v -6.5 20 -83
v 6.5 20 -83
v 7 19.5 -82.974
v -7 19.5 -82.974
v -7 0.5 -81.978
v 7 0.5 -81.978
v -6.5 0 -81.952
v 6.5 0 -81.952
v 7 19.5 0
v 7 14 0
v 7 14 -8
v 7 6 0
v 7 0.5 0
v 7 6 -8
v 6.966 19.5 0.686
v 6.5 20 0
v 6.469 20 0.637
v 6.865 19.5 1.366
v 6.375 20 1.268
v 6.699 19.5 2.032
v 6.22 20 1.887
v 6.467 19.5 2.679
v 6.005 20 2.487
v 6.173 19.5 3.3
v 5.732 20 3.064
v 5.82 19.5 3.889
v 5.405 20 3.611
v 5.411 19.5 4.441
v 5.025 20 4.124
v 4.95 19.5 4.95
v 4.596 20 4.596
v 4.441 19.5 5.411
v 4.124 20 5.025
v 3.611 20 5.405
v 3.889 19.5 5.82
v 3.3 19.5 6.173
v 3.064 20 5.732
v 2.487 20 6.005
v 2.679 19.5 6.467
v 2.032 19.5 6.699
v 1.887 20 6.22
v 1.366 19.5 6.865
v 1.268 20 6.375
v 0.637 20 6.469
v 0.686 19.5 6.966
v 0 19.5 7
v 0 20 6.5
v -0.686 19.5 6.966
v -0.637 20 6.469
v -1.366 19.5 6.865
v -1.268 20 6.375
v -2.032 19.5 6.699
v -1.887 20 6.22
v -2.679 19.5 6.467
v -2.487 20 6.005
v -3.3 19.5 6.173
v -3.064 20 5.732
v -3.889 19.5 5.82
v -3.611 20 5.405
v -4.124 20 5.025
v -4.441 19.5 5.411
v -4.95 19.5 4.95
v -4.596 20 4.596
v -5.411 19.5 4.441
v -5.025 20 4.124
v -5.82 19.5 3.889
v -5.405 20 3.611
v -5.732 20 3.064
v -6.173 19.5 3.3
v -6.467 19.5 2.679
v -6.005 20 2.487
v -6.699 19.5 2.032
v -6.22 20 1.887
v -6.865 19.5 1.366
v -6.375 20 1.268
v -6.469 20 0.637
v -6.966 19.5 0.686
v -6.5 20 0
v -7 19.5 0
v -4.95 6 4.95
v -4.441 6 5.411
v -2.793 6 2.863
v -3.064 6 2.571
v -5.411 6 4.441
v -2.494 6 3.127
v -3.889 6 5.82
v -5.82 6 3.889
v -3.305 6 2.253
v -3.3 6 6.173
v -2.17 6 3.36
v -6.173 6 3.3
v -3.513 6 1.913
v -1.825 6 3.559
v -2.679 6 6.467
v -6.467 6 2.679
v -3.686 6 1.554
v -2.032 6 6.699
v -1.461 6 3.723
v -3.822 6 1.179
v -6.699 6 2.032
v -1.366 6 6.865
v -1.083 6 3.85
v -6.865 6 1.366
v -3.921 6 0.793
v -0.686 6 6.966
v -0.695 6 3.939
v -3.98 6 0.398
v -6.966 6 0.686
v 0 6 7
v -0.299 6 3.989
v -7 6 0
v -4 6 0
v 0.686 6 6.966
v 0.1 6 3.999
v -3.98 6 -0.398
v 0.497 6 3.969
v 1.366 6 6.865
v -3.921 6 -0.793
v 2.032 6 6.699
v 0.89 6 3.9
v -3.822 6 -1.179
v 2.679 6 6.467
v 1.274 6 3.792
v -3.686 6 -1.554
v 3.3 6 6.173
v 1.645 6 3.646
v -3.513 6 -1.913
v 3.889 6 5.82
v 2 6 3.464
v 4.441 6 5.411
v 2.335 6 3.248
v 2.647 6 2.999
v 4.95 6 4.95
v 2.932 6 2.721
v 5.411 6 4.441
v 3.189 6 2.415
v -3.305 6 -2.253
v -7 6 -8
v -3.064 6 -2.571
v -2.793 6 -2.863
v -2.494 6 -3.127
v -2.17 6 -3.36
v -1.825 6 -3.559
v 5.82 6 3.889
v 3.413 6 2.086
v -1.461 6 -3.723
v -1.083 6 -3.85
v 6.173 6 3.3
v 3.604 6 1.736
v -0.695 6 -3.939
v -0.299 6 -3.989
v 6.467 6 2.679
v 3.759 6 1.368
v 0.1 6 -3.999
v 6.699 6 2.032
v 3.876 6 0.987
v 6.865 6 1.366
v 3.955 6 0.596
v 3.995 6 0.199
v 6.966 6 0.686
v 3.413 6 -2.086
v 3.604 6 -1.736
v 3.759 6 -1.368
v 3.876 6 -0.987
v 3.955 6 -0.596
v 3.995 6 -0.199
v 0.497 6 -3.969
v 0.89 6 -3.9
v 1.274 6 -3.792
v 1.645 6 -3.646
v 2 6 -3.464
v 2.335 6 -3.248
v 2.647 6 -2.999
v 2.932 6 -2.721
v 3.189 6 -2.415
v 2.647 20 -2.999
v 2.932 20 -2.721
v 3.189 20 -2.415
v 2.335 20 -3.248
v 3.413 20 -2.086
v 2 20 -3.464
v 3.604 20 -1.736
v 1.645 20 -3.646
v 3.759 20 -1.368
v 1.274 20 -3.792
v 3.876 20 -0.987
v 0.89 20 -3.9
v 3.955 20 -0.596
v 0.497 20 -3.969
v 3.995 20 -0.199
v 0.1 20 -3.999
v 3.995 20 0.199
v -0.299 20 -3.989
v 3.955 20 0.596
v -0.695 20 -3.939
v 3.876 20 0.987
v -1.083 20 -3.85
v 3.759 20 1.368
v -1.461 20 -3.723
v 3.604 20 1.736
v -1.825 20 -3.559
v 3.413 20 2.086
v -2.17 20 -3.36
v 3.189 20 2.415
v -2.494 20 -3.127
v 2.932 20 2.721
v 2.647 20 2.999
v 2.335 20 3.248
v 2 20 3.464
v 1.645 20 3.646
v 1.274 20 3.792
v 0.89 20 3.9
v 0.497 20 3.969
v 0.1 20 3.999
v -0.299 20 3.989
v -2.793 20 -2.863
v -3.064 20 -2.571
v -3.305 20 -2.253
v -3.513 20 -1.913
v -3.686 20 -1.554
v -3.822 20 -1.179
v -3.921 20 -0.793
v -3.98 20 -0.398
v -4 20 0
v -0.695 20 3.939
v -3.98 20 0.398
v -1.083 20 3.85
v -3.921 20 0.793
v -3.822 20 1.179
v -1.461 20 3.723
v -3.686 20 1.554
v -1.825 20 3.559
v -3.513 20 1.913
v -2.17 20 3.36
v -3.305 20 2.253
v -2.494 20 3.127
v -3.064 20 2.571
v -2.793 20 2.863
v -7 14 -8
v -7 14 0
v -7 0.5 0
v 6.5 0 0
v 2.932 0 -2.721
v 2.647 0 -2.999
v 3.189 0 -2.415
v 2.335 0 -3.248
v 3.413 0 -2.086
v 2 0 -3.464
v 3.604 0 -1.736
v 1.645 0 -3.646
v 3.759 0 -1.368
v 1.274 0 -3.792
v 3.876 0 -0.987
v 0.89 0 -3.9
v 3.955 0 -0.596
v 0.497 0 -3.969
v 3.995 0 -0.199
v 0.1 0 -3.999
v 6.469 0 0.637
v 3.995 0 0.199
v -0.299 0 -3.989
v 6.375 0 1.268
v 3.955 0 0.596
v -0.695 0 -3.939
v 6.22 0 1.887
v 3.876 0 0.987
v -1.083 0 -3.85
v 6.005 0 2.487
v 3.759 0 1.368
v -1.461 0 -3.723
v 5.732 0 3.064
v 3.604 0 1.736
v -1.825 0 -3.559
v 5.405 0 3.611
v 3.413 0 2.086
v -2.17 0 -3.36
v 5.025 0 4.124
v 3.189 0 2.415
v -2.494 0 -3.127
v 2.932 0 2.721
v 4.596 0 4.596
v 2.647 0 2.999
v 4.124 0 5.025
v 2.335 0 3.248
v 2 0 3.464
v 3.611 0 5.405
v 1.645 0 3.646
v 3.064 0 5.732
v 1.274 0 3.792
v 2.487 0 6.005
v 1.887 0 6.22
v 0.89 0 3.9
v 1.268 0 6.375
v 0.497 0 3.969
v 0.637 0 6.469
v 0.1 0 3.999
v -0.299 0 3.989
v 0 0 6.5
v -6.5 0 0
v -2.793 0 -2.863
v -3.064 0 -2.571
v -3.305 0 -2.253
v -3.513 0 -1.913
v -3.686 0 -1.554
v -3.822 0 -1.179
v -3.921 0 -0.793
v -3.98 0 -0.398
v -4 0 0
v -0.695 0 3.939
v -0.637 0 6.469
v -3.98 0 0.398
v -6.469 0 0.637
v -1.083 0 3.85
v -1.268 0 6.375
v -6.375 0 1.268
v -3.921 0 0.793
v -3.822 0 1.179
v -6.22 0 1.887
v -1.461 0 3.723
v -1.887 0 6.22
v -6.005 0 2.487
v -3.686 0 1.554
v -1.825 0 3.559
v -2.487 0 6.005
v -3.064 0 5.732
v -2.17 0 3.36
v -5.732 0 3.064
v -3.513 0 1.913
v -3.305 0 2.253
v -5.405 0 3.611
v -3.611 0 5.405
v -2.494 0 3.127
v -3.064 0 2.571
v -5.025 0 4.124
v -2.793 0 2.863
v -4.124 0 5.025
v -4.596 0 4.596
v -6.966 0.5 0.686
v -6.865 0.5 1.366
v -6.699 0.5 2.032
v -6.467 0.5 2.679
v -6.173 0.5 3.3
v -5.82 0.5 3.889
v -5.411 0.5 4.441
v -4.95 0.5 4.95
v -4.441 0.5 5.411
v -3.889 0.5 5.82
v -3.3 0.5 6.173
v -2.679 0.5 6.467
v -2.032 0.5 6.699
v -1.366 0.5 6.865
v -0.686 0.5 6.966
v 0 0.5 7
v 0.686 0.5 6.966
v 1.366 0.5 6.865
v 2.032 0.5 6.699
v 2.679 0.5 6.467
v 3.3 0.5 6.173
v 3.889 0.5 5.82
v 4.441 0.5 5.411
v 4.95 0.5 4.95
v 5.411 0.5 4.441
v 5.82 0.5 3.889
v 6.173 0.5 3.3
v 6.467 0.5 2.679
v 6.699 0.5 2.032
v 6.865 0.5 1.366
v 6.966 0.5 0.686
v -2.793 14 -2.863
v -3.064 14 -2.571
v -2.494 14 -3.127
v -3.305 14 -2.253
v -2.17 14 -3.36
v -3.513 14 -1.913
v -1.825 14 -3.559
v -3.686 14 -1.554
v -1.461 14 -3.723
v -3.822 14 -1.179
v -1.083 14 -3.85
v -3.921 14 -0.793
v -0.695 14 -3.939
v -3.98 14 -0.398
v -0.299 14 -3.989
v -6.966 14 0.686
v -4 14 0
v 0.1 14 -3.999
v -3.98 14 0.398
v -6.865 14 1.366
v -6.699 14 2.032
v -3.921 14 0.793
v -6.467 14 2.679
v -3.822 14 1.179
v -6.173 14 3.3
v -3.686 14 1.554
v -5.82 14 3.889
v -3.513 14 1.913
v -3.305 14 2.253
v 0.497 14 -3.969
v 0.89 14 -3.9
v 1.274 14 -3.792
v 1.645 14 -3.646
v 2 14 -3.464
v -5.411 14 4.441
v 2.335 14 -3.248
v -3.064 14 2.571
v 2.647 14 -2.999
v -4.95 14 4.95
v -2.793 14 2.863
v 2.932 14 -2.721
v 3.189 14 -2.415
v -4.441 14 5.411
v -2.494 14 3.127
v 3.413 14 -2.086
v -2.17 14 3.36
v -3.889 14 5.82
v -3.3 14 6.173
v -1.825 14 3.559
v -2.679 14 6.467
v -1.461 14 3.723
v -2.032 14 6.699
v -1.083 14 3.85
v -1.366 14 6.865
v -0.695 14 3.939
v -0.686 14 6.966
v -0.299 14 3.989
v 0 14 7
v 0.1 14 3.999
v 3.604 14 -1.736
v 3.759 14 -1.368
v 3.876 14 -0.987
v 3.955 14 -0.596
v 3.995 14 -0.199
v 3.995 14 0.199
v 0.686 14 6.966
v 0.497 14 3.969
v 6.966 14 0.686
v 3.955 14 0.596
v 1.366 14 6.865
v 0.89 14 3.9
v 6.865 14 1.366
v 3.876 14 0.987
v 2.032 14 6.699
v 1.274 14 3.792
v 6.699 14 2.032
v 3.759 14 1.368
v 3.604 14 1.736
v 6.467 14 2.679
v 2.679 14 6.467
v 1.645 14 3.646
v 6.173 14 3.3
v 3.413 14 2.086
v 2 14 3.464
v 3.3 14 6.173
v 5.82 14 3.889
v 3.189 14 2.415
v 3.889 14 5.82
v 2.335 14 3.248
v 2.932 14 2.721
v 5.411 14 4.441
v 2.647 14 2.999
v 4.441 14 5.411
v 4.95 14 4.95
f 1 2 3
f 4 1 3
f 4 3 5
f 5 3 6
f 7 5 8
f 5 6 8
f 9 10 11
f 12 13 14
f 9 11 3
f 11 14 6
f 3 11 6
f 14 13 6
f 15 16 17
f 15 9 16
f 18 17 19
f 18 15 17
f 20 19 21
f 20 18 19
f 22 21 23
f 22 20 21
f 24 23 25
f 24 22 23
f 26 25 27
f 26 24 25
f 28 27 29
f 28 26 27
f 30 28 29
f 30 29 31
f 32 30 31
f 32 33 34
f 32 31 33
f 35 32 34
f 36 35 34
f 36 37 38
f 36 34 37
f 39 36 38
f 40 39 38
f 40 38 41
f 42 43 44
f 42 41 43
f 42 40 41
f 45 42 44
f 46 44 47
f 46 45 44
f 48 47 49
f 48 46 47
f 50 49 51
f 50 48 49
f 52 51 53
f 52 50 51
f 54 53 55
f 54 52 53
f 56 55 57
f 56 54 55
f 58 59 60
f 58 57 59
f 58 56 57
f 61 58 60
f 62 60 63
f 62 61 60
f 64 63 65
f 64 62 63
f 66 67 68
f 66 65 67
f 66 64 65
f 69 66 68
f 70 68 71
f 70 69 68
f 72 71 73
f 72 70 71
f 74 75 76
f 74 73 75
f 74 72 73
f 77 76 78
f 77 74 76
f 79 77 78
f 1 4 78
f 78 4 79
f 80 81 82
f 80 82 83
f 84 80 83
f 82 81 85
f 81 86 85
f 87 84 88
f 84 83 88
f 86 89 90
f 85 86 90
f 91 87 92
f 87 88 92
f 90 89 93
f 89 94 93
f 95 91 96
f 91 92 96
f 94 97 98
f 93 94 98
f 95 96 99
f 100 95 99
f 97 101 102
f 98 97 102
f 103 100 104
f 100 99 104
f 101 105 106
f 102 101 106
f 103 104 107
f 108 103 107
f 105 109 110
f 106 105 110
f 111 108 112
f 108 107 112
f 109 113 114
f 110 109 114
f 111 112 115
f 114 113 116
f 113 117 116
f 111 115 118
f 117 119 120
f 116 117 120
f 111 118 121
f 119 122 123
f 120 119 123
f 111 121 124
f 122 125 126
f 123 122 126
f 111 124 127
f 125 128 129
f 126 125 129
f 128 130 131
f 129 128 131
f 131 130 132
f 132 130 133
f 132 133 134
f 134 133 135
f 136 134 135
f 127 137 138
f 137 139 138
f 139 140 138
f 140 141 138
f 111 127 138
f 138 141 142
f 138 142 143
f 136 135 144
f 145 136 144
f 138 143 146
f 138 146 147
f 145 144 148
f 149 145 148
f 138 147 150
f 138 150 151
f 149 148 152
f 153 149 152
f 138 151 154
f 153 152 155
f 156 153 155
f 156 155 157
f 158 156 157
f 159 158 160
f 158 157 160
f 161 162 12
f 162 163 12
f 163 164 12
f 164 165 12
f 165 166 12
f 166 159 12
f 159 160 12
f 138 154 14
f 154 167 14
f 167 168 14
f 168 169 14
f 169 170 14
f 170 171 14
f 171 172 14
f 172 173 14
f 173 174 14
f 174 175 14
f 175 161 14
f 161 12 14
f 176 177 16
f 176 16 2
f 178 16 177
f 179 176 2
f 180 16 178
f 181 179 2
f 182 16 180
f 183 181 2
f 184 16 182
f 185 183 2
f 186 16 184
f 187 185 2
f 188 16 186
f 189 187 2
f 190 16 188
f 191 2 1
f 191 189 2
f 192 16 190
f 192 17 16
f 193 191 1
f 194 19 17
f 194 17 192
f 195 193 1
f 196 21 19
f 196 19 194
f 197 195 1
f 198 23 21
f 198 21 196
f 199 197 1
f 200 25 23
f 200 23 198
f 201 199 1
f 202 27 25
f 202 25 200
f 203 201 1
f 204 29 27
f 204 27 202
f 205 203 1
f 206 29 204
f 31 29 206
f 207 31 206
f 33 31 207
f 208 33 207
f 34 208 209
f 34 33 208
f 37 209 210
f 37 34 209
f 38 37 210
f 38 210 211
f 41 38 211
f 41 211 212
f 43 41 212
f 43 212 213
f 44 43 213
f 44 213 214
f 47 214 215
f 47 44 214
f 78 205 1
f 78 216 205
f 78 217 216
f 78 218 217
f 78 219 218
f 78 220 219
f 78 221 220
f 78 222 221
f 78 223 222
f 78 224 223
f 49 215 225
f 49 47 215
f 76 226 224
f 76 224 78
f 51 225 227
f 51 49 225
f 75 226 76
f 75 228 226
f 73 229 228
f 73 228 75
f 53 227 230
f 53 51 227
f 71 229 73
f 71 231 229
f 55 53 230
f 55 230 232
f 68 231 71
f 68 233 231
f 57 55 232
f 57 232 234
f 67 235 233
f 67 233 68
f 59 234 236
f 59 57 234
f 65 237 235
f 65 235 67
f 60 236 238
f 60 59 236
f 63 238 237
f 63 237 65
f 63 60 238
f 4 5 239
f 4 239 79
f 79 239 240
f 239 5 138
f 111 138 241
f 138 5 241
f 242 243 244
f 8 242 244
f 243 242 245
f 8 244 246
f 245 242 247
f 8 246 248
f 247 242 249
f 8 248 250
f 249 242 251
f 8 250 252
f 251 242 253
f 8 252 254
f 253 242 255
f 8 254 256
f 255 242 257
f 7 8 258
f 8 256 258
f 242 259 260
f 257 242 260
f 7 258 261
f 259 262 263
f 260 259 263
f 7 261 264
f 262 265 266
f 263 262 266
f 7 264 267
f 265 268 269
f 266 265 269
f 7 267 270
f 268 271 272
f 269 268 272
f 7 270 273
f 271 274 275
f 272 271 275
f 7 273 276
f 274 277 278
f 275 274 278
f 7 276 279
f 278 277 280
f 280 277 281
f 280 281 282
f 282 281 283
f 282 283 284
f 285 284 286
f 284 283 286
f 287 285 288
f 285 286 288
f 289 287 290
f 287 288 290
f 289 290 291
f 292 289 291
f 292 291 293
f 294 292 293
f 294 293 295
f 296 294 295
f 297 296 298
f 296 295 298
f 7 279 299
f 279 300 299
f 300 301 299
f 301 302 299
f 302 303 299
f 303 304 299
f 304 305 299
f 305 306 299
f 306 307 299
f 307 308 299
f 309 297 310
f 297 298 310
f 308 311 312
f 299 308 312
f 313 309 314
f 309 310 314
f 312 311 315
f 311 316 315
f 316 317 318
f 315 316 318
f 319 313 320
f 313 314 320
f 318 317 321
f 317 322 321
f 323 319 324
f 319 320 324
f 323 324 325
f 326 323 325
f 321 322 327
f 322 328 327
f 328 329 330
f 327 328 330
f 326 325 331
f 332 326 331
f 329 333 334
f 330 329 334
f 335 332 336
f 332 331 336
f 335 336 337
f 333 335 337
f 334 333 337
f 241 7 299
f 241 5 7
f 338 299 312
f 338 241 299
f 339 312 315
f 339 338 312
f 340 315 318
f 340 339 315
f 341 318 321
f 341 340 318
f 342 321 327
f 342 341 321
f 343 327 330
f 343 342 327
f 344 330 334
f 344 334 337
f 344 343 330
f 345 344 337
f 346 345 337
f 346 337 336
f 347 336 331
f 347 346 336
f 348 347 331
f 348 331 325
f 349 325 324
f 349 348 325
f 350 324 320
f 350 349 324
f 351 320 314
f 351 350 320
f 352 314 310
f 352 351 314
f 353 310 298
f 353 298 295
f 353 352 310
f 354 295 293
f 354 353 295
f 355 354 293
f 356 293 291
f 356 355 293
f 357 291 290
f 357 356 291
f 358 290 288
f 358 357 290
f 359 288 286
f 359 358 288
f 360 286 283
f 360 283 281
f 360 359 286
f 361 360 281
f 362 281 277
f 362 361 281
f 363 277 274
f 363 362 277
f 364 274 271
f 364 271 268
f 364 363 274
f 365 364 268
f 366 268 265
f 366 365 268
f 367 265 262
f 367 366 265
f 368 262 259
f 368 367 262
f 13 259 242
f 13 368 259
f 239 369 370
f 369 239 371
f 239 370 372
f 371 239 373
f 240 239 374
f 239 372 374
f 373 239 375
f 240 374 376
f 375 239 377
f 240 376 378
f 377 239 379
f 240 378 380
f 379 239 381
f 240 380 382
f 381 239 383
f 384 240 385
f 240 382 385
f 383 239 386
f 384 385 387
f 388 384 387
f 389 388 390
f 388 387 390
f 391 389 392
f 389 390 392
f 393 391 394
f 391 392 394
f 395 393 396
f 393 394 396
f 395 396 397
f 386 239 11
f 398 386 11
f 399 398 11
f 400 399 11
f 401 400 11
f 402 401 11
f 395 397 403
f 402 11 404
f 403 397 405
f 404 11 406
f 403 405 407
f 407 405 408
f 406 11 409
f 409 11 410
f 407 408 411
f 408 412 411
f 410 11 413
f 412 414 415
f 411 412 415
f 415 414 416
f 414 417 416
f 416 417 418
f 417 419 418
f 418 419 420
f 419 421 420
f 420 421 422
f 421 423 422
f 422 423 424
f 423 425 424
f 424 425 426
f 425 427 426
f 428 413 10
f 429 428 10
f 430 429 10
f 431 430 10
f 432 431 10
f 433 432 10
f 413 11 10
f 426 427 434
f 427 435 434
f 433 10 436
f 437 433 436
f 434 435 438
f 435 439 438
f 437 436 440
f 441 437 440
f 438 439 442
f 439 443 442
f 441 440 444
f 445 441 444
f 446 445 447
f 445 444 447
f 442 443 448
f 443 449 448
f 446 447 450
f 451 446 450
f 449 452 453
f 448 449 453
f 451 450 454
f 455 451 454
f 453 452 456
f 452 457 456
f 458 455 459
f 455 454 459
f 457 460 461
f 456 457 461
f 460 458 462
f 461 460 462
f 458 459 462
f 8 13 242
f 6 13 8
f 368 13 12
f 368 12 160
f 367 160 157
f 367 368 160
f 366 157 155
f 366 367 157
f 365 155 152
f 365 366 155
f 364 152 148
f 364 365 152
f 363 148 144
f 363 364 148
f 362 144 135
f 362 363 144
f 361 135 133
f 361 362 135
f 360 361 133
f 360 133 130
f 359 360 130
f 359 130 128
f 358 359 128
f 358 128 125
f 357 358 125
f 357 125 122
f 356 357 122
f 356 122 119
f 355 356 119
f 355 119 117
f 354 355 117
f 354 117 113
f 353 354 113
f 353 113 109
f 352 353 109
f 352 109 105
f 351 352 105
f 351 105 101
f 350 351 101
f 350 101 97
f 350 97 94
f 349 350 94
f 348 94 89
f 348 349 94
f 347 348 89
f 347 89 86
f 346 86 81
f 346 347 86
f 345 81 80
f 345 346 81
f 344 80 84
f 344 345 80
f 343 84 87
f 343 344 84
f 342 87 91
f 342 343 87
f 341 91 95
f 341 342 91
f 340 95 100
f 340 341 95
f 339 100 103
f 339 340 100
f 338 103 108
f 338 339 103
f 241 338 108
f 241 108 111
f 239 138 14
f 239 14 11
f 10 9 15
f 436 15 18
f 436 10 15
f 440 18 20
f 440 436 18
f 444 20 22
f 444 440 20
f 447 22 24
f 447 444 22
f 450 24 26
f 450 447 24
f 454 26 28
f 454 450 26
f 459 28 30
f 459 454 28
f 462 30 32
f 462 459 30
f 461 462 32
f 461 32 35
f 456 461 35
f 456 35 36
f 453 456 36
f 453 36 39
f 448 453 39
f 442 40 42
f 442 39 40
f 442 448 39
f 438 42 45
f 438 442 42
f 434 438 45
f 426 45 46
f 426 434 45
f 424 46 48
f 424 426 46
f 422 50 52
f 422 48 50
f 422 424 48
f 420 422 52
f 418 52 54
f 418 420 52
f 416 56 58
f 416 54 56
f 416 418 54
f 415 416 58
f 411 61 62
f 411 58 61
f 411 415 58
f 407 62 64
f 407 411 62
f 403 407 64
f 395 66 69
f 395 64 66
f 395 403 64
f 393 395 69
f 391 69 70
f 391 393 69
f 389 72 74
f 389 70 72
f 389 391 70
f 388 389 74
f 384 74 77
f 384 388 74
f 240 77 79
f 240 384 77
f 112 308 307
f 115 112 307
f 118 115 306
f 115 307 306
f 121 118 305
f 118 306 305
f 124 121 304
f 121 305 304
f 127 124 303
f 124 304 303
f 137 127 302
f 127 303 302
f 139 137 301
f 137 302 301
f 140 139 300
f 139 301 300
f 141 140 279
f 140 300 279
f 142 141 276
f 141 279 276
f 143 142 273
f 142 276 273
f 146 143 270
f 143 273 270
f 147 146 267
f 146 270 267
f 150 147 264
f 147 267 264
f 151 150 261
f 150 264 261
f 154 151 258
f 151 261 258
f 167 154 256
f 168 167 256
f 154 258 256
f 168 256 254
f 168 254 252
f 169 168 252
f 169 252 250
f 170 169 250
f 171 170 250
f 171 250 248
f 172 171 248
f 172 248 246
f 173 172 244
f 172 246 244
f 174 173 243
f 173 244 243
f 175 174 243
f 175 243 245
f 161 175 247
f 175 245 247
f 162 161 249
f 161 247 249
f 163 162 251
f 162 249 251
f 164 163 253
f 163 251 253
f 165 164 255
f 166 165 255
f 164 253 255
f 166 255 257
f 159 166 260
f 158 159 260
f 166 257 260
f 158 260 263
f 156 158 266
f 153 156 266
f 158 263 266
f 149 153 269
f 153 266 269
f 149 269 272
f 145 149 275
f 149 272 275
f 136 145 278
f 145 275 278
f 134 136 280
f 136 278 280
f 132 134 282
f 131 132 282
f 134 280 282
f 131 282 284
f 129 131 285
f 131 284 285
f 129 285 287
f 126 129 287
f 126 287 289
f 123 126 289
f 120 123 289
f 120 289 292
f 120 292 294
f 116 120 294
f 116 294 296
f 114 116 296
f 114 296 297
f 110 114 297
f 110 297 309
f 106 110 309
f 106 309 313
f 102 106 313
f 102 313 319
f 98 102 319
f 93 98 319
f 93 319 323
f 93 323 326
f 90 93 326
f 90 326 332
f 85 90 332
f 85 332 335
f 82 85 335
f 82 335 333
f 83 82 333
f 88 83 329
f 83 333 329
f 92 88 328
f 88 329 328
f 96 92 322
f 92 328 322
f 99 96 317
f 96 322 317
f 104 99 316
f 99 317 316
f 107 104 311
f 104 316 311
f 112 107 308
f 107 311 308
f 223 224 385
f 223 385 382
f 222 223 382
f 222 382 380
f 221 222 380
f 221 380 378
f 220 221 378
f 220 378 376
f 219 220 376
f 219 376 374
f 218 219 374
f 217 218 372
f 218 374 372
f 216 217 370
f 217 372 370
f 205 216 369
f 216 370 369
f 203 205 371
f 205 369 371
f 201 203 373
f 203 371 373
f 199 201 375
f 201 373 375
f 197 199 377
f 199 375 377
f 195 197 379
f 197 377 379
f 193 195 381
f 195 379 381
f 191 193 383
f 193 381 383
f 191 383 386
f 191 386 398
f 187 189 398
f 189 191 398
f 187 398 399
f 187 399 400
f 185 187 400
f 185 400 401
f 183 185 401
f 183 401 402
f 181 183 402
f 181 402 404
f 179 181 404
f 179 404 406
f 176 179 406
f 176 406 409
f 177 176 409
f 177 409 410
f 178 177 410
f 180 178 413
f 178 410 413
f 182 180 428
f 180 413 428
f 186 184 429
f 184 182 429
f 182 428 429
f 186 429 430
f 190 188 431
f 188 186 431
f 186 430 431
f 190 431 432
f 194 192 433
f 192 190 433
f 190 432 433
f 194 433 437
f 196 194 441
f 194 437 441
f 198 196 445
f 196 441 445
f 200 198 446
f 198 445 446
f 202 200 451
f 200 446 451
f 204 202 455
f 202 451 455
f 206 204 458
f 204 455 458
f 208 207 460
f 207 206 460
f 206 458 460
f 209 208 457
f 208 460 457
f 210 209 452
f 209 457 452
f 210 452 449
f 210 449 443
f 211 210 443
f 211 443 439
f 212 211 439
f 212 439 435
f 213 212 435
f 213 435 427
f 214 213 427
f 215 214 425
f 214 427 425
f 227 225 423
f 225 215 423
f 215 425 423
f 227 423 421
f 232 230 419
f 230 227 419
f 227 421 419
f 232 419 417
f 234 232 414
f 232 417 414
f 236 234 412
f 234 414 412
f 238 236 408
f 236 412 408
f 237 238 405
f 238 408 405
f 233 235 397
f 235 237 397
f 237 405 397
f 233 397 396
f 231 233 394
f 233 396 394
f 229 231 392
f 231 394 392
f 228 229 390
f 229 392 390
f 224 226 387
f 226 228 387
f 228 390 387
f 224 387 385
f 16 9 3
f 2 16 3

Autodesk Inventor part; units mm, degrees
ref_plane "YZ Plane" through (0, 0, 0) normal (1, 0, 0) x (0, 1, 0)
ref_plane "XZ Plane" through (0, 0, 0) normal (0, 1, 0) x (-1, 0, 0)
ref_plane "XY Plane" through (0, 0, 0) normal (0, 0, 1) x (1, 0, 0)
sketch "Sketch1" plane through (0, 0, 0) normal (0, 1, 0) x (-1, 0, 0)
  arc A0 (7, 0) -> (-7, 0) centre (0, 0) ccw
  circle A1 centre (0, 0) radius 4
  line L0 (-7, 0) -> (-7, -83)
  line L1 (-7, -83) -> (7, -83)
  line L2 (7, -83) -> (7, 0)
  point P0 (0, -83)
  dimension "d0" = 14
  dimension "d1" = 8
  dimension "d2" = 83
  dimension "d3" = 14
  dimension "d4" = 83
  dimension "d5" = 0
extrude "Extrusion1" add sketch "Sketch1" along normal blind 20
sketch "Sketch2" plane through (7, 0, 0) normal (1, 0, 0) x (0, 0, -1)
  line L0 (0, 20) -> (83, 20) projected
  line L1 (83, 0) -> (83, 20) projected
  line L2 (83, 20) -> (81.9518, 0)
  line L3 (83, 20) -> (107.3414, 20) construction
  line L4 (83, 20) -> (83, 0)
  line L5 (83, 0) -> (81.9518, 0)
  line L6 (0, 0) -> (83, 0) projected
  dimension "d9" = 93
extrude "Extrusion2" cut sketch "Sketch2" against normal through all
sketch "Sketch3" plane through (7, 0, 0) normal (1, 0, 0) x (0, 0, -1)
  line L0 (-7, 6) -> (8, 6)
  line L1 (8, 6) -> (8, 14)
  line L2 (8, 14) -> (-7, 14)
  line L3 (-7, 14) -> (-7, 6)
  line L4 (-7, 6) -> (8, 14) construction
  line L5 (8, 6) -> (-7, 14) construction
  point P0 (0, 0)
  point P1 (0.5, 10)
  dimension "d12" = 10
  dimension "d13" = 15
  dimension "d14" = 8
  dimension "d15" = 7
extrude "Extrusion3" cut sketch "Sketch3" against normal through all
chamfer "Chamfer1" distance 0.5 angle 45 6 edges at (7, 0, -40.9759) (0, 0, 7) (-7, 0, -40.9759) (7, 20, -41.5) (0, 20, 7) (-7, 20, -41.5)
properties part number "Schneidstempel"
